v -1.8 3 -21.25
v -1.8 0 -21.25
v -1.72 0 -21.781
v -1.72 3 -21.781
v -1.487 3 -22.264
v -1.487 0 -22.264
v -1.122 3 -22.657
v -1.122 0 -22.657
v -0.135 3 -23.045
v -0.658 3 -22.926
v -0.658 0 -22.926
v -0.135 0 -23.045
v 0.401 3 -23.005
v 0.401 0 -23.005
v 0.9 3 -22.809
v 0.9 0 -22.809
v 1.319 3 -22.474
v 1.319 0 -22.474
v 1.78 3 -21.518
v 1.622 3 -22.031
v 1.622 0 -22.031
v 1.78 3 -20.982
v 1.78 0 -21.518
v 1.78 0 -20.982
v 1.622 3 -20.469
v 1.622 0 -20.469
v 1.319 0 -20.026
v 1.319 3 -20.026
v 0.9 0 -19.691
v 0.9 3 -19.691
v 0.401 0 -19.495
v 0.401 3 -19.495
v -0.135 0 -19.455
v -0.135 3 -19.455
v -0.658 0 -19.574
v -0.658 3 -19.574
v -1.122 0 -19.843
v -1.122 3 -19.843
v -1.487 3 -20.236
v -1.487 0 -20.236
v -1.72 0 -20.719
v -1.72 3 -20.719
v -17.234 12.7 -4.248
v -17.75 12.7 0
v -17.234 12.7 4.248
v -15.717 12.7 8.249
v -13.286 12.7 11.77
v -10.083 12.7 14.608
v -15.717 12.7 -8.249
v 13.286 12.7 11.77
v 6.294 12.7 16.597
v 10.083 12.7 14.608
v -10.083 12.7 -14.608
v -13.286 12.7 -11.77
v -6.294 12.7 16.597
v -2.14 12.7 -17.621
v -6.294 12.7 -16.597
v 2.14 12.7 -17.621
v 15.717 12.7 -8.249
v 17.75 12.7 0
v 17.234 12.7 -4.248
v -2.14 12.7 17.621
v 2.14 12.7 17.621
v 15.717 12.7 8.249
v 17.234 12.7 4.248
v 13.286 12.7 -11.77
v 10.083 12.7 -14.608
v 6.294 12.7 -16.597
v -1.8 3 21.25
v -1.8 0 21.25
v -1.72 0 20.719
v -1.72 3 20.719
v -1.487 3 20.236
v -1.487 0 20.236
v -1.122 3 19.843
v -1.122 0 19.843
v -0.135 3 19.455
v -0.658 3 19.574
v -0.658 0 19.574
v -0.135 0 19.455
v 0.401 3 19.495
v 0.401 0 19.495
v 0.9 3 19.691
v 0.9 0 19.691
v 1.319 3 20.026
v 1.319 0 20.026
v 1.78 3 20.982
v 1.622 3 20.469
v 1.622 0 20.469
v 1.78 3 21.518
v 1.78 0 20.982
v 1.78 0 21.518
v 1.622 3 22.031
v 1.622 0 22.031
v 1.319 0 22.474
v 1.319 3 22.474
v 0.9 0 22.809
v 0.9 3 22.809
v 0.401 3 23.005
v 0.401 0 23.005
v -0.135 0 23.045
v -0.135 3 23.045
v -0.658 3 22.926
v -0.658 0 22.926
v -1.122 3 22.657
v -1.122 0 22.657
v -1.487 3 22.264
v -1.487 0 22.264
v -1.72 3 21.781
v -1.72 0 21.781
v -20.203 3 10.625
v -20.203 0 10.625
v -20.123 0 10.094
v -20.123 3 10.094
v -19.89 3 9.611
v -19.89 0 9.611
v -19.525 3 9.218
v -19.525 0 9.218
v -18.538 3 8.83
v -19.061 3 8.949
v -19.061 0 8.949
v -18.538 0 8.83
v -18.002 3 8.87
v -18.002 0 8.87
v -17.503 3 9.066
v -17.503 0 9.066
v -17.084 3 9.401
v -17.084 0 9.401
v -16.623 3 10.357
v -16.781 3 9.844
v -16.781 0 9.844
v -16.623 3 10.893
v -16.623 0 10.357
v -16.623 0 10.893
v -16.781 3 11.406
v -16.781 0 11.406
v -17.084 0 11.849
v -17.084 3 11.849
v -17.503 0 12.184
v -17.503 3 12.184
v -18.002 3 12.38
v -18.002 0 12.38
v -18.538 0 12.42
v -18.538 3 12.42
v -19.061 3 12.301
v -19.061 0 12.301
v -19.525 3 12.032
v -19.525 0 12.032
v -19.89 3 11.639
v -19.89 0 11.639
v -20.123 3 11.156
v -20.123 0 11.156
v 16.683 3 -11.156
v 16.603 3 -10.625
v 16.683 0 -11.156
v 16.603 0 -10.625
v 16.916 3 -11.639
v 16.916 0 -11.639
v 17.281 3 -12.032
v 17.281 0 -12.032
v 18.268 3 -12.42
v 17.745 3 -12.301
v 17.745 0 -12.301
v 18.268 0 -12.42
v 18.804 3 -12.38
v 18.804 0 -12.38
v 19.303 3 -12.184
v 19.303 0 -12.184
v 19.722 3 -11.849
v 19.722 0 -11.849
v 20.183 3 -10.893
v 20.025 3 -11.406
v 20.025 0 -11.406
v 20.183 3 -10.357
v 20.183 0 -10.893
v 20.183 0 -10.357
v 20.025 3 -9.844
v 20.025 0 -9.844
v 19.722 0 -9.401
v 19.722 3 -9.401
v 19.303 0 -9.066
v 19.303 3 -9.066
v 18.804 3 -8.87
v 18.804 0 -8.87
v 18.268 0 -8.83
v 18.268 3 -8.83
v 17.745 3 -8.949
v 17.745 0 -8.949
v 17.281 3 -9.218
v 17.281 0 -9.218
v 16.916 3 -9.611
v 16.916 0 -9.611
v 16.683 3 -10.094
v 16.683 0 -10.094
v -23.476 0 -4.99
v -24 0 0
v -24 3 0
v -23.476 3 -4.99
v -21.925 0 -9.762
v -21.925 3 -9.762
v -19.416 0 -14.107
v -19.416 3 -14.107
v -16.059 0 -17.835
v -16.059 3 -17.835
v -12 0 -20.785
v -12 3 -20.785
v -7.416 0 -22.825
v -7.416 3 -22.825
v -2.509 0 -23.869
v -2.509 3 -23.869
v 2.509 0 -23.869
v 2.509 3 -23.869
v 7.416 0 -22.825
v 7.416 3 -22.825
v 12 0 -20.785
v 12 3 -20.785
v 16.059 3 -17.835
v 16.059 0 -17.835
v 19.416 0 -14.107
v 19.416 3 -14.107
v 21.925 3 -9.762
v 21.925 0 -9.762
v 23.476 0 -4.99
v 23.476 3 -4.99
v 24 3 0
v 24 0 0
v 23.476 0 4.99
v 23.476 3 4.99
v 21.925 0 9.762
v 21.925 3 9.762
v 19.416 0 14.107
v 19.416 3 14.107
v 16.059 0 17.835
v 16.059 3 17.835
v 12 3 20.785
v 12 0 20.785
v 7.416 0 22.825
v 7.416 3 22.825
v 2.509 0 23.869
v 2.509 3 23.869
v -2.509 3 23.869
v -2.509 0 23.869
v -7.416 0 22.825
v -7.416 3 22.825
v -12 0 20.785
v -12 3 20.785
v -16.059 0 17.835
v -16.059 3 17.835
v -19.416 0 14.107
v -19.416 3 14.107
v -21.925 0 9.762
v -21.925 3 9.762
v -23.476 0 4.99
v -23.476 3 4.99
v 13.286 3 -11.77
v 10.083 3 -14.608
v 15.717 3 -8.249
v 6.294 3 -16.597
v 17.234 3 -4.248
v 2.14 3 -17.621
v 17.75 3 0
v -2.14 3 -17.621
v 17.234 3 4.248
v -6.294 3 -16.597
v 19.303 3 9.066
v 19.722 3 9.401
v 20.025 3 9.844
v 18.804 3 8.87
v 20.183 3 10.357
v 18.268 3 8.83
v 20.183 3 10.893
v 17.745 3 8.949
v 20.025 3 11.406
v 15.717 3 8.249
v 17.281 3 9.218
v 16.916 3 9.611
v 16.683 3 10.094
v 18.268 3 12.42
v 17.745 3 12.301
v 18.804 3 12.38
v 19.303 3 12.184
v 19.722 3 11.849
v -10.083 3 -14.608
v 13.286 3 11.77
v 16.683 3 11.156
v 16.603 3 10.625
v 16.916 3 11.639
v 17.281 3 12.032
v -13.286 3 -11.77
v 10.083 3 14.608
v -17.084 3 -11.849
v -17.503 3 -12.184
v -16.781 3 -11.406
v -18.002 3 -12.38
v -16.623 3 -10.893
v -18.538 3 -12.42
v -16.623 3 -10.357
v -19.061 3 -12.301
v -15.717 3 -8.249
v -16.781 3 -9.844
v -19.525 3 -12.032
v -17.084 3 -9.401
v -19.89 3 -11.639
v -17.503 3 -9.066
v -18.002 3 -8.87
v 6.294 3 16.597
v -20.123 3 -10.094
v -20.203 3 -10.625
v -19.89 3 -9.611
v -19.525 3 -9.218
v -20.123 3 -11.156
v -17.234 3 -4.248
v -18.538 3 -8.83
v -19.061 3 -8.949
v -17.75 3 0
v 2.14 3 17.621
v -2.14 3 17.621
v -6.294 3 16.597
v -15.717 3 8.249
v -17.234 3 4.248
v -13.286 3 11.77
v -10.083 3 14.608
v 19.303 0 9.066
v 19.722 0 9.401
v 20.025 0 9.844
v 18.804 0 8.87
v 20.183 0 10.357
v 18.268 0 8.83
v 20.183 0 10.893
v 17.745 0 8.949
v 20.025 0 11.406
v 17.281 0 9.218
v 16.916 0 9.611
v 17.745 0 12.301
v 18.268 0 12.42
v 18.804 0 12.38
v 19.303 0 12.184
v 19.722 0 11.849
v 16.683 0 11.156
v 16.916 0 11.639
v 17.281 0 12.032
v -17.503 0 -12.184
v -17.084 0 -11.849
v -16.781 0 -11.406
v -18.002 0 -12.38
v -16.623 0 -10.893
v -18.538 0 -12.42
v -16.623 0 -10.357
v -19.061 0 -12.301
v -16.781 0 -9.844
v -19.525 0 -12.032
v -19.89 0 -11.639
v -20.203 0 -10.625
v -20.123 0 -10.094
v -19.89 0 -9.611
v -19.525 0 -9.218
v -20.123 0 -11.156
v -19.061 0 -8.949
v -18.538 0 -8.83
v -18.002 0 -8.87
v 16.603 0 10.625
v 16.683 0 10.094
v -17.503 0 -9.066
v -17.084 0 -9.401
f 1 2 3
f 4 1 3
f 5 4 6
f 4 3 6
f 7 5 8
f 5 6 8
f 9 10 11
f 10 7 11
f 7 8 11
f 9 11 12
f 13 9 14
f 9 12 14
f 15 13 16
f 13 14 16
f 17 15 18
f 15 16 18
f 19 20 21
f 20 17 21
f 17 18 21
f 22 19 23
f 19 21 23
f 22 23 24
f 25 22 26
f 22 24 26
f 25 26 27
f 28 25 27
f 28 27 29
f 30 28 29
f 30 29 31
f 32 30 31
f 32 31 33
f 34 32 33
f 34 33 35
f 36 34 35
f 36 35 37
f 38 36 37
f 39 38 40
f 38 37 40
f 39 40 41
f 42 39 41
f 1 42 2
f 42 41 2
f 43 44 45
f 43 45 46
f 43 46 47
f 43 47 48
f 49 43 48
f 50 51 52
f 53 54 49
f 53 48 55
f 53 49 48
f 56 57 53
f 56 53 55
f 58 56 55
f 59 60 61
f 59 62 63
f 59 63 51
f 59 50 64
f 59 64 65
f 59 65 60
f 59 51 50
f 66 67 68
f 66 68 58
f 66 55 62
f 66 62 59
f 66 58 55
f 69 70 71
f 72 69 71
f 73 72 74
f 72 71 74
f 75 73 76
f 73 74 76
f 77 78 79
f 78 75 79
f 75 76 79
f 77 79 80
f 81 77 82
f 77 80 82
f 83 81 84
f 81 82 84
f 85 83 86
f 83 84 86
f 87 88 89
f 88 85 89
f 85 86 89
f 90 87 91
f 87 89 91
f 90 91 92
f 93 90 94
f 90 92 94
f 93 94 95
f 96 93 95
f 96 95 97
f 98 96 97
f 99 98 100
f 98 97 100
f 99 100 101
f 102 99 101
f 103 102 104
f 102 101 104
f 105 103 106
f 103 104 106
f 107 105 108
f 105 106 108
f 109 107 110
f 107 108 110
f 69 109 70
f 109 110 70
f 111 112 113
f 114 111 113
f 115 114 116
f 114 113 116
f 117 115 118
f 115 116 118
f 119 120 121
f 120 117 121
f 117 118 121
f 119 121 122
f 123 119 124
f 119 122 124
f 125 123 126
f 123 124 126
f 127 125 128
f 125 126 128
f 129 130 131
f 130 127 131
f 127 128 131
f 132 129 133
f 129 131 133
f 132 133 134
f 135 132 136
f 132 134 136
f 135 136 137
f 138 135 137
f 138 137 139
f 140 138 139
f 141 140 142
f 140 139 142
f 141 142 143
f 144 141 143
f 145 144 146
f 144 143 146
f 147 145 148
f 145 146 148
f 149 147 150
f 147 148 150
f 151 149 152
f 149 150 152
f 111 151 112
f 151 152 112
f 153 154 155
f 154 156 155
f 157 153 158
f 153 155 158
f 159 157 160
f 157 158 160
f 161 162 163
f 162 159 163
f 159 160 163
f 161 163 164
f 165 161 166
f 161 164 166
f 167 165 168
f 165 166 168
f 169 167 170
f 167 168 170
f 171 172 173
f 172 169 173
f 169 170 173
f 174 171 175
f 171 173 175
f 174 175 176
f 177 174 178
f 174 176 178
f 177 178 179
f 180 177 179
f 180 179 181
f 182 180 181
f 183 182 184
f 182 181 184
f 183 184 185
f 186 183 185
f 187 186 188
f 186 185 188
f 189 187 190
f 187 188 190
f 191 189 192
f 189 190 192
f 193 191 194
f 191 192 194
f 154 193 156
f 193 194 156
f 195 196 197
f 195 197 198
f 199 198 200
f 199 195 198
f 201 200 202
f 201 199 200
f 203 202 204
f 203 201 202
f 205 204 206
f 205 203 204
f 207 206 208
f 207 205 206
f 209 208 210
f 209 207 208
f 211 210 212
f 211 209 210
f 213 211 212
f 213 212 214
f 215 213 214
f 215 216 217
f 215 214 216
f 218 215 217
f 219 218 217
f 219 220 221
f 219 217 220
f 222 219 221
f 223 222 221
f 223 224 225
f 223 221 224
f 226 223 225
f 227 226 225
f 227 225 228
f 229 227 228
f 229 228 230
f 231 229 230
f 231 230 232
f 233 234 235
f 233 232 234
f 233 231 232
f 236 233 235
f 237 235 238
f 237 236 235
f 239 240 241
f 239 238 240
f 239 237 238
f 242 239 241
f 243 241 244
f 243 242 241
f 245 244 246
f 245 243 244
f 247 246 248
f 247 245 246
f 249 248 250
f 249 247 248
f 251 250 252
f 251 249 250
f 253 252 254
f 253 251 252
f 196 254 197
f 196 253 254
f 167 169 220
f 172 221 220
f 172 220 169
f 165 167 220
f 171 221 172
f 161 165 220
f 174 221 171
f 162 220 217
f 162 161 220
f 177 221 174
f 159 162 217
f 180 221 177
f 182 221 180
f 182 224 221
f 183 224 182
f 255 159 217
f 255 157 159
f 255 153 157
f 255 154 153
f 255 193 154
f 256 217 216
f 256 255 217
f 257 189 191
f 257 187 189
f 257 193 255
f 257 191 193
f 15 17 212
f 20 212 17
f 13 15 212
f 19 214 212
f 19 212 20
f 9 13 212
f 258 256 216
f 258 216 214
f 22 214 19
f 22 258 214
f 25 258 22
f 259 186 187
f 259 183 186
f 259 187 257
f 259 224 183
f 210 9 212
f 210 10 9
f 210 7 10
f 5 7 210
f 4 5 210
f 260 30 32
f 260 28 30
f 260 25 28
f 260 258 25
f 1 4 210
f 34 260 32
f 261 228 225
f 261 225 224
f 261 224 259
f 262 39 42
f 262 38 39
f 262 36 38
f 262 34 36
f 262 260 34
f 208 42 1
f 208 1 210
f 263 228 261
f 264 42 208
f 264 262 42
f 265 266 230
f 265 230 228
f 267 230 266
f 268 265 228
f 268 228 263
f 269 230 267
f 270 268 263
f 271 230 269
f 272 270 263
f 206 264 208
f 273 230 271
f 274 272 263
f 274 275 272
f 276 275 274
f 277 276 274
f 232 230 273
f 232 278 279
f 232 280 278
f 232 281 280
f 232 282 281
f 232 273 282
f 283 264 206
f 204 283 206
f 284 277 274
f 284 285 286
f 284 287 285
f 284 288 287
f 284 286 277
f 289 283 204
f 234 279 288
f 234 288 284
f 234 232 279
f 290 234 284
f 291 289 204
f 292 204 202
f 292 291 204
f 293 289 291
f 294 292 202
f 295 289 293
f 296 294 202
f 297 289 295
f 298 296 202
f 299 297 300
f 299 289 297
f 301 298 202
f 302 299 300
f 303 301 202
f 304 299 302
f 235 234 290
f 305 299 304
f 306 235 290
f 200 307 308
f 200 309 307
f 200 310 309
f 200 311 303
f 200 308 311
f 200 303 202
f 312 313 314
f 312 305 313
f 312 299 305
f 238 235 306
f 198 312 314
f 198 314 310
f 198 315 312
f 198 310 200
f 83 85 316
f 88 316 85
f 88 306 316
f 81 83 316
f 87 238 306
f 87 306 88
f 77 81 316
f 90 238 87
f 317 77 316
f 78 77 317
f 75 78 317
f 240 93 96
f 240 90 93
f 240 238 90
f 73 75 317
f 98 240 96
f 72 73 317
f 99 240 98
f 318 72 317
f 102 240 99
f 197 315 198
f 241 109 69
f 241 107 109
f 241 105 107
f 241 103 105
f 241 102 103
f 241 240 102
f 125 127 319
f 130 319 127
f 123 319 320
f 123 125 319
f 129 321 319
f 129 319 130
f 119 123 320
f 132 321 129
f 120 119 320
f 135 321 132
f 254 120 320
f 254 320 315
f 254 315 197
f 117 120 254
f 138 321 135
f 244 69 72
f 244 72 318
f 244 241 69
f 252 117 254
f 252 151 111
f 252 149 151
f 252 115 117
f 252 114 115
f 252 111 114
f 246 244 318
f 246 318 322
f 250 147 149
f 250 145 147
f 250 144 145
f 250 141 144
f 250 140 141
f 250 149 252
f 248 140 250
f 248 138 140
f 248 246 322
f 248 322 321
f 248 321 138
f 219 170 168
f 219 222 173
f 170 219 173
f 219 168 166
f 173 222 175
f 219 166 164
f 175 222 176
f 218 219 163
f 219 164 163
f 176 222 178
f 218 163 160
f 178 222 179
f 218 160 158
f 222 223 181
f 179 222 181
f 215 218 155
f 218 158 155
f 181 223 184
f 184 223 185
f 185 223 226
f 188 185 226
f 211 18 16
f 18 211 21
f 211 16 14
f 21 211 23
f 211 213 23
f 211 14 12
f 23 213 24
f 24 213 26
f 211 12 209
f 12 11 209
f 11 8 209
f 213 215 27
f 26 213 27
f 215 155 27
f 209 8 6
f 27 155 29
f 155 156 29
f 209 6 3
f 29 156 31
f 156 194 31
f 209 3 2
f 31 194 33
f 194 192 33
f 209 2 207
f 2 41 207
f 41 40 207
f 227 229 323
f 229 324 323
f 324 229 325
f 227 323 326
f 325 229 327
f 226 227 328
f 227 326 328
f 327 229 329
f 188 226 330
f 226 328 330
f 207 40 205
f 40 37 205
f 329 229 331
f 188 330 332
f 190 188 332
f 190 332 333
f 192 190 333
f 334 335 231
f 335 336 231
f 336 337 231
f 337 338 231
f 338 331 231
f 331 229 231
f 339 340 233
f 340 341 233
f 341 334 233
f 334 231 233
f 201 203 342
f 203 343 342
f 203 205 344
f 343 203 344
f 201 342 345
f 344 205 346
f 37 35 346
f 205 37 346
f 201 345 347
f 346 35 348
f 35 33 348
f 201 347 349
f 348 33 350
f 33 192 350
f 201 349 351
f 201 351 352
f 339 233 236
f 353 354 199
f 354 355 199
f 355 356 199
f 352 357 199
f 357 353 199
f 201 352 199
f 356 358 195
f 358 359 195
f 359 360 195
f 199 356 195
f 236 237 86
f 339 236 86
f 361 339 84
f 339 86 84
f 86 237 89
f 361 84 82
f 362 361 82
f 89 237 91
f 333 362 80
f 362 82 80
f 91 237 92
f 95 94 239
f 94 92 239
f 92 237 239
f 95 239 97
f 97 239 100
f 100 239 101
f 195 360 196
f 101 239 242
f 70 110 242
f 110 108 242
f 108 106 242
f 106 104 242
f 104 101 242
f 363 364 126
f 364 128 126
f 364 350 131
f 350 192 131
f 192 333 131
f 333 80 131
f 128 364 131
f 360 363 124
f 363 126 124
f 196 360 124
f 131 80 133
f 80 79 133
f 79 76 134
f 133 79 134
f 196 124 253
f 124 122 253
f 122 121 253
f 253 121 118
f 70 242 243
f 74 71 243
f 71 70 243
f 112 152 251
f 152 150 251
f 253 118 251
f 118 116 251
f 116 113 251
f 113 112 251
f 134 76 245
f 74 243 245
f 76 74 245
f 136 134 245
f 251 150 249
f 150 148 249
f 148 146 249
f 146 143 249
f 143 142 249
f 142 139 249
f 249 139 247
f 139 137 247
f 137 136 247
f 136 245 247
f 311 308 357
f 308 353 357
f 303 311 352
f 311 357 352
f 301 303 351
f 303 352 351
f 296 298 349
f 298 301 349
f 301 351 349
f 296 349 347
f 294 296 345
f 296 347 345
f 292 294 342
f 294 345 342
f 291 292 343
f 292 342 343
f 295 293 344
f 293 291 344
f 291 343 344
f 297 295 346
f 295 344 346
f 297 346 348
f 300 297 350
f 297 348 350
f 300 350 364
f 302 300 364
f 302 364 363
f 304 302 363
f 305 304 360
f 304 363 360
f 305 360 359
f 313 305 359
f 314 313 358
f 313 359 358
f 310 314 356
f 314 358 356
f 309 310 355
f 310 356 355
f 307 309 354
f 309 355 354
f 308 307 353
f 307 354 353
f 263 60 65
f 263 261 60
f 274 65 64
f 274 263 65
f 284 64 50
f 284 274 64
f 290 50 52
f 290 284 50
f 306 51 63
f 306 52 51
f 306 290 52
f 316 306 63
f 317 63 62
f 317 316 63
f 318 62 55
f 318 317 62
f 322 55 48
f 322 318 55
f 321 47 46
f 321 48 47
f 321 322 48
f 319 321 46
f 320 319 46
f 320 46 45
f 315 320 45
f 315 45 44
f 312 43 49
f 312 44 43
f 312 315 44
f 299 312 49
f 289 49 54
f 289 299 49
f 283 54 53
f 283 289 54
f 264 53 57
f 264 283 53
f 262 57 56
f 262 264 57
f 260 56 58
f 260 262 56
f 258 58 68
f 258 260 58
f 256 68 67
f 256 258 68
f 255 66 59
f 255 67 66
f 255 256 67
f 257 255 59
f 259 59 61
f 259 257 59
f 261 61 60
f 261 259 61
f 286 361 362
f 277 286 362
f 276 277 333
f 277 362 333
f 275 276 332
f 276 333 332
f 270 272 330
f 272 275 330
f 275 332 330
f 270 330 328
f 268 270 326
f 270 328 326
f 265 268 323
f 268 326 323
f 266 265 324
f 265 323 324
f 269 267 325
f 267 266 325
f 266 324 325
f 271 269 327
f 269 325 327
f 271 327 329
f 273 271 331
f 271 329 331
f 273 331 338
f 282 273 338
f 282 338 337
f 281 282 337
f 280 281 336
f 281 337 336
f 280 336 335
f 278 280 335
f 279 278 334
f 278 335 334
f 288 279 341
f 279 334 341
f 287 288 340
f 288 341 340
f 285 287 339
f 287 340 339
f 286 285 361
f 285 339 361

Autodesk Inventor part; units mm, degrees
ref_plane "YZ Plane" through (0, 0, 0) normal (1, 0, 0) x (0, 1, 0)
ref_plane "XZ Plane" through (0, 0, 0) normal (0, 1, 0) x (-1, 0, 0)
ref_plane "XY Plane" through (0, 0, 0) normal (0, 0, 1) x (1, 0, 0)
sketch "Sketch1" plane through (0, 0, 0) normal (0, 1, 0) x (-1, 0, 0)
  circle A0 centre (0, 0) radius 24
  circle A1 centre (0, 0) radius 21.25 construction
  circle A2 centre (0, -21.25) radius 1.8
  circle A3 centre (18.403, -10.625) radius 1.8
  circle A4 centre (18.403, 10.625) radius 1.8
  circle A5 centre (0, 21.25) radius 1.8
  circle A6 centre (-18.403, 10.625) radius 1.8
  circle A7 centre (-18.403, -10.625) radius 1.8
  dimension "d9" = 42.5
  dimension "d7" = 48
  dimension "d11" = 3.6
  dimension "d22" = 360
extrude "Extrusion1" add sketch "Sketch1" along normal blind 3
sketch "Sketch2" plane through (0, 3, 0) normal (0, 1, 0) x (1, 0, 0)
  circle A0 centre (0, 0) radius 17.75
  dimension "d26" = 35.5
extrude "Extrusion3" add sketch "Sketch2" along normal blind 9.7
equation "\"d9\" = iciclesMountD"
equation "\"d7\" = iciclesBaseOuterD"
equation "\"d11\" = clearanceM6"
equation "\"d24\" = isiclesBaseThickness"
equation "\"d26\" = iciclesPlugD"
equation "\"d30\" = chairThickness - isiclesBaseThickness"
equation "\"moduleHeight\" = 96"
equation "\"moduleMountD\" = 6.8"
equation "\"moduleCornerR\" = 5"
equation "\"d4\" = moduleCornerR"
equation "\"d5\" = moduleMountD"
equation "\"d6\" = moduleMountD"
equation "\"d8\" = moduleMountD"
equation "\"d10\" = moduleMountD"
equation "\"moduleOpeningR\" = 25"
equation "\"d13\" = moduleOpeningR"
equation "\"thickness\" = 6"
equation "\"d15\" = thickness"
equation "\"d16\" = 0"
equation "\"iciclesMountD\" = 42.5"
equation "\"d17\" = iciclesMountD"
equation "\"clearanceM6\" = 3.6"
equation "\"d18\" = clearanceM6"
equation "\"d21\" = 360deg"
equation "\"d0\" = moduleHeight"
equation "\"iciclesBaseOuterD\" = 48"
equation "\"iciclesPlugD\" = 35.5"
equation "\"chairThickness\" = 12.7"
equation "\"isiclesBaseThickness\" = 3"
properties part number "Module_bottom_Icicles26"
